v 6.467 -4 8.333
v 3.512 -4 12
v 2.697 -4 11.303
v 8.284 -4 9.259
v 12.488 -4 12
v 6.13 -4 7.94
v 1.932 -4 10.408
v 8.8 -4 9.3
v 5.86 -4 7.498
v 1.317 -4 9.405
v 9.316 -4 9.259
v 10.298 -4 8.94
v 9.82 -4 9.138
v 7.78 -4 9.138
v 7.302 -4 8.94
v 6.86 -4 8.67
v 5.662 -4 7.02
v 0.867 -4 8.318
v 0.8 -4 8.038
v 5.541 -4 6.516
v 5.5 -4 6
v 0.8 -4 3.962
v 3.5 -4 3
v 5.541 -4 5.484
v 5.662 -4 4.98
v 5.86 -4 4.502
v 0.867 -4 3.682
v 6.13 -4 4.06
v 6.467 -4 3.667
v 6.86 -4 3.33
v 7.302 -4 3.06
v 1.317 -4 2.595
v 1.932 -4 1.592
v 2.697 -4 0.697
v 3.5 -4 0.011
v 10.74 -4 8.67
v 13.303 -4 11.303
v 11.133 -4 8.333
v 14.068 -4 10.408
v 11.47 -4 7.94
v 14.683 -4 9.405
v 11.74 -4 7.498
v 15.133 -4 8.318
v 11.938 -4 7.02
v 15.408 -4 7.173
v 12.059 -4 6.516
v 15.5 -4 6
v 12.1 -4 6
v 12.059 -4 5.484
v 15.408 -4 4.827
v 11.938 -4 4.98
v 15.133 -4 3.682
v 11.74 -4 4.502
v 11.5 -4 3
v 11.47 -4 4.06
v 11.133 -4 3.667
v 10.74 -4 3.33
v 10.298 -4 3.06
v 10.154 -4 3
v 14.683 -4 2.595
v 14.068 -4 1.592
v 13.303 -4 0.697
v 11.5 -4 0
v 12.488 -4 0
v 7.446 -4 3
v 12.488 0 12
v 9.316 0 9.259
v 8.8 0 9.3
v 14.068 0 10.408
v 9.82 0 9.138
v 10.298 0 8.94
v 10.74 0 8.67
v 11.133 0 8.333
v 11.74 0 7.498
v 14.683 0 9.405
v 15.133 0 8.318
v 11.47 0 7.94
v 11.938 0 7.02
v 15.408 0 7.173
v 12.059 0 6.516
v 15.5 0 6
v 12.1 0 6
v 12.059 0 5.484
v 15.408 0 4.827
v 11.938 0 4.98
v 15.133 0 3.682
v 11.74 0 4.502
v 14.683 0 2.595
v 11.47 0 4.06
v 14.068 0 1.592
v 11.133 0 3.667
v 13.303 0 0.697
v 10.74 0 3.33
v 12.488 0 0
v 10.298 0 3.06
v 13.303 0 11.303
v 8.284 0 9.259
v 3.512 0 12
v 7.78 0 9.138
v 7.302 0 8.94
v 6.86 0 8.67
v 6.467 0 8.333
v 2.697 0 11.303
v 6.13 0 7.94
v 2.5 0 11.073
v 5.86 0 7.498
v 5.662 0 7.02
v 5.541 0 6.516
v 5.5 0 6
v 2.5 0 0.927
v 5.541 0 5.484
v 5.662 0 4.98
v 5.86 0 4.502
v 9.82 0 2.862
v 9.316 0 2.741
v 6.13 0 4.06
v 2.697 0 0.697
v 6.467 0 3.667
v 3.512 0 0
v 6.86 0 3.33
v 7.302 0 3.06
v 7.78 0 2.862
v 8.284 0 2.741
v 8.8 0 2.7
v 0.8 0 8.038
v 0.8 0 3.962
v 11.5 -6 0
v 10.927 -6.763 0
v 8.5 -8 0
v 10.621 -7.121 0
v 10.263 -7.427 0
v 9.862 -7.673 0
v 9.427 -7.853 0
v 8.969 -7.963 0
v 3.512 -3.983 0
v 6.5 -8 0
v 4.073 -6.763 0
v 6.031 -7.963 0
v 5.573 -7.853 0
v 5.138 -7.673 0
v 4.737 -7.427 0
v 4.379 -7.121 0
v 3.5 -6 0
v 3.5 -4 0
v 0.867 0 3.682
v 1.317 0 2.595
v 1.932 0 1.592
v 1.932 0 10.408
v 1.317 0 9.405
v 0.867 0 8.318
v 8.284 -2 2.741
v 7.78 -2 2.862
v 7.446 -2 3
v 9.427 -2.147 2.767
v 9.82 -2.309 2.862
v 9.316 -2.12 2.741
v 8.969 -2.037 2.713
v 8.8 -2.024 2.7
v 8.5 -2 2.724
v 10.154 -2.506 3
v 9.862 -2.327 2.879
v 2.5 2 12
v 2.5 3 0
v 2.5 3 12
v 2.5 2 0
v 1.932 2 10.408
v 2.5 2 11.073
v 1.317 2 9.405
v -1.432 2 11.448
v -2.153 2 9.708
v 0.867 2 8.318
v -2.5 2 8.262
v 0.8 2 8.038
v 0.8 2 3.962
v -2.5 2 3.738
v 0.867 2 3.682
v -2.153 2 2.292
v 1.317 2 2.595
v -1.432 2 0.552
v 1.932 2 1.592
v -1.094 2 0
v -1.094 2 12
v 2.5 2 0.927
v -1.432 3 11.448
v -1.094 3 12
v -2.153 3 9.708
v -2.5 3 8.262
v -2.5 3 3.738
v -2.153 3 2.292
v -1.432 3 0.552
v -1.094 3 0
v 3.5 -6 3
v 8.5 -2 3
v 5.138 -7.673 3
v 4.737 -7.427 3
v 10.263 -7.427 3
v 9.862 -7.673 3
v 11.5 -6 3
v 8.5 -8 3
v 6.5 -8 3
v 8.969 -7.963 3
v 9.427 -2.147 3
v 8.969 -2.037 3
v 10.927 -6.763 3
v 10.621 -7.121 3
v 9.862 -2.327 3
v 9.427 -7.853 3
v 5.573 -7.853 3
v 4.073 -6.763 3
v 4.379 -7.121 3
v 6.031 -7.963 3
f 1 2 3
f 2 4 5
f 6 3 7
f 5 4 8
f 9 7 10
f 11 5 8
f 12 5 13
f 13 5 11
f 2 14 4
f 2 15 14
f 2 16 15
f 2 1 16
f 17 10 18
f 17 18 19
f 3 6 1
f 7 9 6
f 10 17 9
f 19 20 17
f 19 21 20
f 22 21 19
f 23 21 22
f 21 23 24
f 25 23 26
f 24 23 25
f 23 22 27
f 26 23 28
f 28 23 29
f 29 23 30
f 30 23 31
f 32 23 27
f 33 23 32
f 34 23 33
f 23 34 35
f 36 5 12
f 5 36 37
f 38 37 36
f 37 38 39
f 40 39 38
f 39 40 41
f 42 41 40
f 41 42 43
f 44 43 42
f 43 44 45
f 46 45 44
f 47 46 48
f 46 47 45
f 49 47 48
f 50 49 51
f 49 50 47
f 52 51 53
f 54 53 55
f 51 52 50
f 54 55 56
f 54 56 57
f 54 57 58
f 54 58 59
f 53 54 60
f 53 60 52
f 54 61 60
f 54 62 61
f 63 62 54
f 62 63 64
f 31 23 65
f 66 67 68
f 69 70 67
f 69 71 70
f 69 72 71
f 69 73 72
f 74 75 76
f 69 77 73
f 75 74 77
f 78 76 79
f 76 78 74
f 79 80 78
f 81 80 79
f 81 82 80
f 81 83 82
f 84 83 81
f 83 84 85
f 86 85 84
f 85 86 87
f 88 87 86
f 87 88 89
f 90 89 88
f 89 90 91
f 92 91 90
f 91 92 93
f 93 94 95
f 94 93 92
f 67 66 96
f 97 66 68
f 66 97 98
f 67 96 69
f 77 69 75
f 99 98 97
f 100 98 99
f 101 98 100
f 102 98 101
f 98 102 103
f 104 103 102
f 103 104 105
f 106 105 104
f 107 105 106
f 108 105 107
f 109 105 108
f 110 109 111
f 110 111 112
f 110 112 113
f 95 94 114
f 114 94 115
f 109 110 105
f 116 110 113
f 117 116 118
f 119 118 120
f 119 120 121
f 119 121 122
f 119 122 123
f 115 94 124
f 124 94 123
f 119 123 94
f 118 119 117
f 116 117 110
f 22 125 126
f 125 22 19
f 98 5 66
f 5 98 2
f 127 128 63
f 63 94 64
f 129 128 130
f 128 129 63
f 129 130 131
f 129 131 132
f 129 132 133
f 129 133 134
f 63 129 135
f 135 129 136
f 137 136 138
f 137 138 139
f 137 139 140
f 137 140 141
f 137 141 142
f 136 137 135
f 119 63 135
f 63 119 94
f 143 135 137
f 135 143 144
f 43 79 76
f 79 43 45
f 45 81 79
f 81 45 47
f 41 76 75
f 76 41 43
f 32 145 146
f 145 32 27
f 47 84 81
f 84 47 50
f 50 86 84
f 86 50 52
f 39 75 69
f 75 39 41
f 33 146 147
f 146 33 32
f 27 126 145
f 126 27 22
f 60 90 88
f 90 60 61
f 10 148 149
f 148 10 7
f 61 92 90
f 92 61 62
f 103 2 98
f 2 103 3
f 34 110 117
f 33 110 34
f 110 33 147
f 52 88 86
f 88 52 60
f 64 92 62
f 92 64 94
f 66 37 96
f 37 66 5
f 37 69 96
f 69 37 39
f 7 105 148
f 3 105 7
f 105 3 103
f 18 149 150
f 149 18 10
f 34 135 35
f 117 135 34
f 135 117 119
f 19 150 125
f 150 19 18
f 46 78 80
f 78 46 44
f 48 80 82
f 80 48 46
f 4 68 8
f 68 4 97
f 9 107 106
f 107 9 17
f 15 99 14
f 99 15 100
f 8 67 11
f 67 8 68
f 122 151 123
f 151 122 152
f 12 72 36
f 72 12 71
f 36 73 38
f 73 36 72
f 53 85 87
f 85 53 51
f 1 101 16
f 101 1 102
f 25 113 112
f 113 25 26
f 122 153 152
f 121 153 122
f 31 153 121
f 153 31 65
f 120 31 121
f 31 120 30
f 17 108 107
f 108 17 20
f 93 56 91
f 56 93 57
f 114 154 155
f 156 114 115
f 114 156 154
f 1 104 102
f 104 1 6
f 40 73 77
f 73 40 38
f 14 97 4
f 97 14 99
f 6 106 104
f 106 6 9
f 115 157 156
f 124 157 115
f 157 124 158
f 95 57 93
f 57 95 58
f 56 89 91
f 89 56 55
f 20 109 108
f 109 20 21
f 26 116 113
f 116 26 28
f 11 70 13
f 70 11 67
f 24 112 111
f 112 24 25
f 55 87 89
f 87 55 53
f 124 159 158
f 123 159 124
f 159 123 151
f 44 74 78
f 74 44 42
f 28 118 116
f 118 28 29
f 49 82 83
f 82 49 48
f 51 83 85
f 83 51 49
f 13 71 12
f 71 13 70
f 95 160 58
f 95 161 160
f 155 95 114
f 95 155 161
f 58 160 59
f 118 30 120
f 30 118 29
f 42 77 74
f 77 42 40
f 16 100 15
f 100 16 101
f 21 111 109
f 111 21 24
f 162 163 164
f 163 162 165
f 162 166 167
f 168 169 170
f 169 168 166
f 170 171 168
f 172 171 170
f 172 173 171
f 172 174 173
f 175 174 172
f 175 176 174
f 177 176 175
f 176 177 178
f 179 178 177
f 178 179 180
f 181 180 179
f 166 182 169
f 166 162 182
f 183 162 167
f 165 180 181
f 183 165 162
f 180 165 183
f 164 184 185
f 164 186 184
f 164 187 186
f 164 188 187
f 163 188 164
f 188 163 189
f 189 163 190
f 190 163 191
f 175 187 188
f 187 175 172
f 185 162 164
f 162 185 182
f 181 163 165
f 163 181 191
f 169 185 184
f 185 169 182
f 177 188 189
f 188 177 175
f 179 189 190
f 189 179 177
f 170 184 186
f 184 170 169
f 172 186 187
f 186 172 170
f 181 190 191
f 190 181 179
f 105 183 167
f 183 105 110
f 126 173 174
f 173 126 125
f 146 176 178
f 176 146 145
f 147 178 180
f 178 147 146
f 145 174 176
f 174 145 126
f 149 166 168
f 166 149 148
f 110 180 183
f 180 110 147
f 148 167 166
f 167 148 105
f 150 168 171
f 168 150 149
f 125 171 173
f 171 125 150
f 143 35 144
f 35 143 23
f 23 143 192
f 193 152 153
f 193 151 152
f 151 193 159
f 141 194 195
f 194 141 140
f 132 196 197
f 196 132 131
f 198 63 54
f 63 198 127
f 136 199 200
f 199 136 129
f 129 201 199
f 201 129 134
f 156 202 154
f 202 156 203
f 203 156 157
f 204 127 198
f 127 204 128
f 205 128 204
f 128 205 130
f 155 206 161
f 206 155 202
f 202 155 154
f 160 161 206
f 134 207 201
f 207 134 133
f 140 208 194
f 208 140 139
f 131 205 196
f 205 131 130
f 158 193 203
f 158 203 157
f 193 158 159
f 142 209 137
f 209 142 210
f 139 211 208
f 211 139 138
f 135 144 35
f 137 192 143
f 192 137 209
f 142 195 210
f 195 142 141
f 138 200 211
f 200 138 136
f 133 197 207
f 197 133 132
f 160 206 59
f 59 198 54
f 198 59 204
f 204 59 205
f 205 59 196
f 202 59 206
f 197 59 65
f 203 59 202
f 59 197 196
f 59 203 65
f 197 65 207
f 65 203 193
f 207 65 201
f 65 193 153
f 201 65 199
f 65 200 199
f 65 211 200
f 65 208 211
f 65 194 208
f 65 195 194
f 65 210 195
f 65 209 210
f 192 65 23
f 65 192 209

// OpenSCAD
// file: vars.scad
// FRAME = The outer dimension of the matte and backing board
//         (Use the inner dimension of the wooden frame as the basis, but remove 0.5-1mm for wiggle room)

// PANEL = The size of the electronic board with the screen
//         (Measure it or get it from the manufacturer's website)

// VIEWPORT = The size of portion that has the pixels to be shown
//           (Best to start with the manufacturer's website - might need a tad modified)

// PIN = The four round holes/pins that connect the matte to the backboard

// BOX = The container for the electronics behind the frame (part of the backing board)

// RIBBON (CUTOUT) = The ribbon cable that goes to the eInk display.  
//				     Cutout = the space to go between the matte and the backing board

// TAB = The connectors that keep the back/matte into the wooden frame (1 stationary, 3 moving tabs)


// All numbers (length/width/etc.) are in millimeter

frame_width = 176; // 6 7/8" + 1mm
frame_height = 126;  // 4 7/8" + 2mm

matte_depth = 3; // was 3 mm (2.75mm is too thin)

backboard_depth = 3; // 3mm

panel_width = 170.2 + 1;// add a 1mm clearance
panel_height = 111.2 + 1;// add a 1mm clearance
panel_depth = 2.25;

viewport_width = 163.2 + 2; 
viewport_height = 97.92 + 2; 

viewport_to_panel_width_offset = 0;
viewport_to_panel_height_offset = -3;

ribbon_cutout_width = 25; // width of cutout for ribbon cable
ribbon_cutout_height = 2;
ribbon_cutout_width_offset = 1;  // + = move right, - = move left (looking from the back)

ribbon_slot_height = 6;

// Alignment pins (which line up the matte with the back board)
pin_width = 3;
pin_offset = 3.5;
pin_up = 3;
pin_back_indent = 3;  // Indent the back pins so that there is only one way the two sides match

// The electronics box (mounted on the back board)
box_width = 140;
box_height = 100;
box_depth  = 23;
box_thickness = 2;

box_corner_post_radius = 5;
box_screw_head_diameter = 5;
box_screw_diameter = 3;

frame_to_box_height_offset = 6;

// Tab - goes into the slot of the frame
backboard_tab_width = 60;
backboard_tab_height = 2.5;
backboard_tab_depth = 1;

// Movable tabs - the round pins connecting the three other sides (beyond the primary tab)
movable_tab_width = 6;
movable_tab_offset = 8;
movable_tab_depth = 4;


// Power Cord cutout (the place where the power cord goes)
power_cord_slot_diameter = 5; // 5mm space for the cable
power_cord_slot_height   = 6; // 10mm of vertical spacing for the slot
power_cord_slot_offset = 30;  // How far the power cord cutout is from the bottom

// Standoffs (for electronic boards)
standoff_screw_diameter = 2.5;
standoff_depth = 4.5;


// backplate
backplate_depth = 4;
backplate_pocket_depth = 1.5;

// stand
stand_angle = 55;
stand_length = 90;  // the size (length) of the rectangular "rod" (was 100)
stand_width = 4;     // the size of the rectangular "rod"
stand_height = 9;    // the size of the rectangular "rod"

// Control how "good" the circles are
$fn = $preview ? 20 : 40;


// Computed items below
frame_bottom_border_height = (frame_height - panel_height)/2 + viewport_to_panel_height_offset;
frame_top_border_height    = (frame_height - panel_height)/2 - viewport_to_panel_height_offset;
pin_height = backboard_depth;

latch_width =  2 * movable_tab_width;
// main file
include <vars.scad>

module latch_base() {
   hole_width = movable_tab_width * 1.1;
   length = movable_tab_offset * 1.25 + hole_width;
   depth = movable_tab_depth;
   
   translate([movable_tab_offset * 0.1, 0, 0])
    difference() {
        
        intersection() {
            cube([length, latch_width, depth]);
            translate([latch_width * 0.6, latch_width/2,0]) 
                cylinder(d=latch_width*1.25, h=depth);
            };
            
    translate([movable_tab_offset, latch_width/2, 0]) 
        cylinder(d=hole_width, h=depth);
   };
};

module latch_tab_extension() {
   x_diff_percent = 0.68;   // why 0.68?
    
   length = backboard_tab_height * 2; // underneath is same length as tab itself (from tip)
   depth = backboard_tab_depth;
   
   z_diff = backboard_depth - backboard_tab_depth;
   x_diff = backboard_tab_height * x_diff_percent;  
    
   translate([-backboard_tab_height, 0, -backboard_depth])
     intersection() {
        cube([length, latch_width, depth]);
        translate([latch_width * 0.98, latch_width/2, -0]) // allow for a slightly flat top (<1 = flat top)
            cylinder(r=latch_width, h=backboard_tab_depth);
        };     
    
    if (z_diff > 0) {
        translate([(1-x_diff_percent) * backboard_tab_height, 0, -z_diff])
            intersection() {
                cube([x_diff, latch_width, z_diff]);
                translate([latch_width * 0.6, latch_width/2, 0]) 
                    cylinder(d=latch_width*1.25, h=backboard_depth); // match top part's roundness
                };
        
        };    

};

module latch_handle() {
   length = movable_tab_offset;
   width = 3;
   depth = 4;
   r = 3;
  
   translate([3.5, 0, movable_tab_depth])
      hull() {
        cube([length, width, depth/2]);
        rotate([90,0,0]) translate([r, depth-r, -width]) cylinder(h=width, r=r);
        rotate([90,0,0]) translate([length-r, depth-r, -width]) cylinder(h=width, r=r);
        };
};

module latch() {
    rotate([90, 0, 0]) {
        latch_base();
        latch_tab_extension();
        latch_handle();
        };
    };

latch();
